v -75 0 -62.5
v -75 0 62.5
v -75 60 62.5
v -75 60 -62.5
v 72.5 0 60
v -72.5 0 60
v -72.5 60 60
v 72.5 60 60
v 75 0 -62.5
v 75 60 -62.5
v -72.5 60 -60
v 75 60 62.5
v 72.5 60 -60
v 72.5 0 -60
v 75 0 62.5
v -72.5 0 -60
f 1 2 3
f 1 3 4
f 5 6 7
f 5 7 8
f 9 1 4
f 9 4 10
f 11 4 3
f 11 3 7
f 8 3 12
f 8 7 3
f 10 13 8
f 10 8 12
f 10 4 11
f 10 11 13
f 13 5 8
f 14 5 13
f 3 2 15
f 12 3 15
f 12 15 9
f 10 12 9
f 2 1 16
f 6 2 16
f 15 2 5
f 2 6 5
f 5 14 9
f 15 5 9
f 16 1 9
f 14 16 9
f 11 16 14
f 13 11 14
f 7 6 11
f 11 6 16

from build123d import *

# Parameters (mm, degrees)
SKETCH1_W           = 150
SKETCH1_H           = 125
BOSS_EXTRUDE1_DEPTH = 60
SHELL1_T            = -2.5


with BuildPart() as part:
    # Sketch1 → Boss-Extrude1 (new body)
    with BuildSketch(Plane(origin=(0, 0, 0), x_dir=(1, 0, 0), z_dir=(0, 1, 0))):
        Rectangle(SKETCH1_W, SKETCH1_H)
    extrude(amount=BOSS_EXTRUDE1_DEPTH)

    # Shell1
    shell1_openings = [part.faces().sort_by_distance(p)[0] for p in [
        (0, 60, 0),
        (0, 0, 0),
    ]]
    offset(amount=SHELL1_T, openings=shell1_openings, kind=Kind.INTERSECTION)


solid = part.part
